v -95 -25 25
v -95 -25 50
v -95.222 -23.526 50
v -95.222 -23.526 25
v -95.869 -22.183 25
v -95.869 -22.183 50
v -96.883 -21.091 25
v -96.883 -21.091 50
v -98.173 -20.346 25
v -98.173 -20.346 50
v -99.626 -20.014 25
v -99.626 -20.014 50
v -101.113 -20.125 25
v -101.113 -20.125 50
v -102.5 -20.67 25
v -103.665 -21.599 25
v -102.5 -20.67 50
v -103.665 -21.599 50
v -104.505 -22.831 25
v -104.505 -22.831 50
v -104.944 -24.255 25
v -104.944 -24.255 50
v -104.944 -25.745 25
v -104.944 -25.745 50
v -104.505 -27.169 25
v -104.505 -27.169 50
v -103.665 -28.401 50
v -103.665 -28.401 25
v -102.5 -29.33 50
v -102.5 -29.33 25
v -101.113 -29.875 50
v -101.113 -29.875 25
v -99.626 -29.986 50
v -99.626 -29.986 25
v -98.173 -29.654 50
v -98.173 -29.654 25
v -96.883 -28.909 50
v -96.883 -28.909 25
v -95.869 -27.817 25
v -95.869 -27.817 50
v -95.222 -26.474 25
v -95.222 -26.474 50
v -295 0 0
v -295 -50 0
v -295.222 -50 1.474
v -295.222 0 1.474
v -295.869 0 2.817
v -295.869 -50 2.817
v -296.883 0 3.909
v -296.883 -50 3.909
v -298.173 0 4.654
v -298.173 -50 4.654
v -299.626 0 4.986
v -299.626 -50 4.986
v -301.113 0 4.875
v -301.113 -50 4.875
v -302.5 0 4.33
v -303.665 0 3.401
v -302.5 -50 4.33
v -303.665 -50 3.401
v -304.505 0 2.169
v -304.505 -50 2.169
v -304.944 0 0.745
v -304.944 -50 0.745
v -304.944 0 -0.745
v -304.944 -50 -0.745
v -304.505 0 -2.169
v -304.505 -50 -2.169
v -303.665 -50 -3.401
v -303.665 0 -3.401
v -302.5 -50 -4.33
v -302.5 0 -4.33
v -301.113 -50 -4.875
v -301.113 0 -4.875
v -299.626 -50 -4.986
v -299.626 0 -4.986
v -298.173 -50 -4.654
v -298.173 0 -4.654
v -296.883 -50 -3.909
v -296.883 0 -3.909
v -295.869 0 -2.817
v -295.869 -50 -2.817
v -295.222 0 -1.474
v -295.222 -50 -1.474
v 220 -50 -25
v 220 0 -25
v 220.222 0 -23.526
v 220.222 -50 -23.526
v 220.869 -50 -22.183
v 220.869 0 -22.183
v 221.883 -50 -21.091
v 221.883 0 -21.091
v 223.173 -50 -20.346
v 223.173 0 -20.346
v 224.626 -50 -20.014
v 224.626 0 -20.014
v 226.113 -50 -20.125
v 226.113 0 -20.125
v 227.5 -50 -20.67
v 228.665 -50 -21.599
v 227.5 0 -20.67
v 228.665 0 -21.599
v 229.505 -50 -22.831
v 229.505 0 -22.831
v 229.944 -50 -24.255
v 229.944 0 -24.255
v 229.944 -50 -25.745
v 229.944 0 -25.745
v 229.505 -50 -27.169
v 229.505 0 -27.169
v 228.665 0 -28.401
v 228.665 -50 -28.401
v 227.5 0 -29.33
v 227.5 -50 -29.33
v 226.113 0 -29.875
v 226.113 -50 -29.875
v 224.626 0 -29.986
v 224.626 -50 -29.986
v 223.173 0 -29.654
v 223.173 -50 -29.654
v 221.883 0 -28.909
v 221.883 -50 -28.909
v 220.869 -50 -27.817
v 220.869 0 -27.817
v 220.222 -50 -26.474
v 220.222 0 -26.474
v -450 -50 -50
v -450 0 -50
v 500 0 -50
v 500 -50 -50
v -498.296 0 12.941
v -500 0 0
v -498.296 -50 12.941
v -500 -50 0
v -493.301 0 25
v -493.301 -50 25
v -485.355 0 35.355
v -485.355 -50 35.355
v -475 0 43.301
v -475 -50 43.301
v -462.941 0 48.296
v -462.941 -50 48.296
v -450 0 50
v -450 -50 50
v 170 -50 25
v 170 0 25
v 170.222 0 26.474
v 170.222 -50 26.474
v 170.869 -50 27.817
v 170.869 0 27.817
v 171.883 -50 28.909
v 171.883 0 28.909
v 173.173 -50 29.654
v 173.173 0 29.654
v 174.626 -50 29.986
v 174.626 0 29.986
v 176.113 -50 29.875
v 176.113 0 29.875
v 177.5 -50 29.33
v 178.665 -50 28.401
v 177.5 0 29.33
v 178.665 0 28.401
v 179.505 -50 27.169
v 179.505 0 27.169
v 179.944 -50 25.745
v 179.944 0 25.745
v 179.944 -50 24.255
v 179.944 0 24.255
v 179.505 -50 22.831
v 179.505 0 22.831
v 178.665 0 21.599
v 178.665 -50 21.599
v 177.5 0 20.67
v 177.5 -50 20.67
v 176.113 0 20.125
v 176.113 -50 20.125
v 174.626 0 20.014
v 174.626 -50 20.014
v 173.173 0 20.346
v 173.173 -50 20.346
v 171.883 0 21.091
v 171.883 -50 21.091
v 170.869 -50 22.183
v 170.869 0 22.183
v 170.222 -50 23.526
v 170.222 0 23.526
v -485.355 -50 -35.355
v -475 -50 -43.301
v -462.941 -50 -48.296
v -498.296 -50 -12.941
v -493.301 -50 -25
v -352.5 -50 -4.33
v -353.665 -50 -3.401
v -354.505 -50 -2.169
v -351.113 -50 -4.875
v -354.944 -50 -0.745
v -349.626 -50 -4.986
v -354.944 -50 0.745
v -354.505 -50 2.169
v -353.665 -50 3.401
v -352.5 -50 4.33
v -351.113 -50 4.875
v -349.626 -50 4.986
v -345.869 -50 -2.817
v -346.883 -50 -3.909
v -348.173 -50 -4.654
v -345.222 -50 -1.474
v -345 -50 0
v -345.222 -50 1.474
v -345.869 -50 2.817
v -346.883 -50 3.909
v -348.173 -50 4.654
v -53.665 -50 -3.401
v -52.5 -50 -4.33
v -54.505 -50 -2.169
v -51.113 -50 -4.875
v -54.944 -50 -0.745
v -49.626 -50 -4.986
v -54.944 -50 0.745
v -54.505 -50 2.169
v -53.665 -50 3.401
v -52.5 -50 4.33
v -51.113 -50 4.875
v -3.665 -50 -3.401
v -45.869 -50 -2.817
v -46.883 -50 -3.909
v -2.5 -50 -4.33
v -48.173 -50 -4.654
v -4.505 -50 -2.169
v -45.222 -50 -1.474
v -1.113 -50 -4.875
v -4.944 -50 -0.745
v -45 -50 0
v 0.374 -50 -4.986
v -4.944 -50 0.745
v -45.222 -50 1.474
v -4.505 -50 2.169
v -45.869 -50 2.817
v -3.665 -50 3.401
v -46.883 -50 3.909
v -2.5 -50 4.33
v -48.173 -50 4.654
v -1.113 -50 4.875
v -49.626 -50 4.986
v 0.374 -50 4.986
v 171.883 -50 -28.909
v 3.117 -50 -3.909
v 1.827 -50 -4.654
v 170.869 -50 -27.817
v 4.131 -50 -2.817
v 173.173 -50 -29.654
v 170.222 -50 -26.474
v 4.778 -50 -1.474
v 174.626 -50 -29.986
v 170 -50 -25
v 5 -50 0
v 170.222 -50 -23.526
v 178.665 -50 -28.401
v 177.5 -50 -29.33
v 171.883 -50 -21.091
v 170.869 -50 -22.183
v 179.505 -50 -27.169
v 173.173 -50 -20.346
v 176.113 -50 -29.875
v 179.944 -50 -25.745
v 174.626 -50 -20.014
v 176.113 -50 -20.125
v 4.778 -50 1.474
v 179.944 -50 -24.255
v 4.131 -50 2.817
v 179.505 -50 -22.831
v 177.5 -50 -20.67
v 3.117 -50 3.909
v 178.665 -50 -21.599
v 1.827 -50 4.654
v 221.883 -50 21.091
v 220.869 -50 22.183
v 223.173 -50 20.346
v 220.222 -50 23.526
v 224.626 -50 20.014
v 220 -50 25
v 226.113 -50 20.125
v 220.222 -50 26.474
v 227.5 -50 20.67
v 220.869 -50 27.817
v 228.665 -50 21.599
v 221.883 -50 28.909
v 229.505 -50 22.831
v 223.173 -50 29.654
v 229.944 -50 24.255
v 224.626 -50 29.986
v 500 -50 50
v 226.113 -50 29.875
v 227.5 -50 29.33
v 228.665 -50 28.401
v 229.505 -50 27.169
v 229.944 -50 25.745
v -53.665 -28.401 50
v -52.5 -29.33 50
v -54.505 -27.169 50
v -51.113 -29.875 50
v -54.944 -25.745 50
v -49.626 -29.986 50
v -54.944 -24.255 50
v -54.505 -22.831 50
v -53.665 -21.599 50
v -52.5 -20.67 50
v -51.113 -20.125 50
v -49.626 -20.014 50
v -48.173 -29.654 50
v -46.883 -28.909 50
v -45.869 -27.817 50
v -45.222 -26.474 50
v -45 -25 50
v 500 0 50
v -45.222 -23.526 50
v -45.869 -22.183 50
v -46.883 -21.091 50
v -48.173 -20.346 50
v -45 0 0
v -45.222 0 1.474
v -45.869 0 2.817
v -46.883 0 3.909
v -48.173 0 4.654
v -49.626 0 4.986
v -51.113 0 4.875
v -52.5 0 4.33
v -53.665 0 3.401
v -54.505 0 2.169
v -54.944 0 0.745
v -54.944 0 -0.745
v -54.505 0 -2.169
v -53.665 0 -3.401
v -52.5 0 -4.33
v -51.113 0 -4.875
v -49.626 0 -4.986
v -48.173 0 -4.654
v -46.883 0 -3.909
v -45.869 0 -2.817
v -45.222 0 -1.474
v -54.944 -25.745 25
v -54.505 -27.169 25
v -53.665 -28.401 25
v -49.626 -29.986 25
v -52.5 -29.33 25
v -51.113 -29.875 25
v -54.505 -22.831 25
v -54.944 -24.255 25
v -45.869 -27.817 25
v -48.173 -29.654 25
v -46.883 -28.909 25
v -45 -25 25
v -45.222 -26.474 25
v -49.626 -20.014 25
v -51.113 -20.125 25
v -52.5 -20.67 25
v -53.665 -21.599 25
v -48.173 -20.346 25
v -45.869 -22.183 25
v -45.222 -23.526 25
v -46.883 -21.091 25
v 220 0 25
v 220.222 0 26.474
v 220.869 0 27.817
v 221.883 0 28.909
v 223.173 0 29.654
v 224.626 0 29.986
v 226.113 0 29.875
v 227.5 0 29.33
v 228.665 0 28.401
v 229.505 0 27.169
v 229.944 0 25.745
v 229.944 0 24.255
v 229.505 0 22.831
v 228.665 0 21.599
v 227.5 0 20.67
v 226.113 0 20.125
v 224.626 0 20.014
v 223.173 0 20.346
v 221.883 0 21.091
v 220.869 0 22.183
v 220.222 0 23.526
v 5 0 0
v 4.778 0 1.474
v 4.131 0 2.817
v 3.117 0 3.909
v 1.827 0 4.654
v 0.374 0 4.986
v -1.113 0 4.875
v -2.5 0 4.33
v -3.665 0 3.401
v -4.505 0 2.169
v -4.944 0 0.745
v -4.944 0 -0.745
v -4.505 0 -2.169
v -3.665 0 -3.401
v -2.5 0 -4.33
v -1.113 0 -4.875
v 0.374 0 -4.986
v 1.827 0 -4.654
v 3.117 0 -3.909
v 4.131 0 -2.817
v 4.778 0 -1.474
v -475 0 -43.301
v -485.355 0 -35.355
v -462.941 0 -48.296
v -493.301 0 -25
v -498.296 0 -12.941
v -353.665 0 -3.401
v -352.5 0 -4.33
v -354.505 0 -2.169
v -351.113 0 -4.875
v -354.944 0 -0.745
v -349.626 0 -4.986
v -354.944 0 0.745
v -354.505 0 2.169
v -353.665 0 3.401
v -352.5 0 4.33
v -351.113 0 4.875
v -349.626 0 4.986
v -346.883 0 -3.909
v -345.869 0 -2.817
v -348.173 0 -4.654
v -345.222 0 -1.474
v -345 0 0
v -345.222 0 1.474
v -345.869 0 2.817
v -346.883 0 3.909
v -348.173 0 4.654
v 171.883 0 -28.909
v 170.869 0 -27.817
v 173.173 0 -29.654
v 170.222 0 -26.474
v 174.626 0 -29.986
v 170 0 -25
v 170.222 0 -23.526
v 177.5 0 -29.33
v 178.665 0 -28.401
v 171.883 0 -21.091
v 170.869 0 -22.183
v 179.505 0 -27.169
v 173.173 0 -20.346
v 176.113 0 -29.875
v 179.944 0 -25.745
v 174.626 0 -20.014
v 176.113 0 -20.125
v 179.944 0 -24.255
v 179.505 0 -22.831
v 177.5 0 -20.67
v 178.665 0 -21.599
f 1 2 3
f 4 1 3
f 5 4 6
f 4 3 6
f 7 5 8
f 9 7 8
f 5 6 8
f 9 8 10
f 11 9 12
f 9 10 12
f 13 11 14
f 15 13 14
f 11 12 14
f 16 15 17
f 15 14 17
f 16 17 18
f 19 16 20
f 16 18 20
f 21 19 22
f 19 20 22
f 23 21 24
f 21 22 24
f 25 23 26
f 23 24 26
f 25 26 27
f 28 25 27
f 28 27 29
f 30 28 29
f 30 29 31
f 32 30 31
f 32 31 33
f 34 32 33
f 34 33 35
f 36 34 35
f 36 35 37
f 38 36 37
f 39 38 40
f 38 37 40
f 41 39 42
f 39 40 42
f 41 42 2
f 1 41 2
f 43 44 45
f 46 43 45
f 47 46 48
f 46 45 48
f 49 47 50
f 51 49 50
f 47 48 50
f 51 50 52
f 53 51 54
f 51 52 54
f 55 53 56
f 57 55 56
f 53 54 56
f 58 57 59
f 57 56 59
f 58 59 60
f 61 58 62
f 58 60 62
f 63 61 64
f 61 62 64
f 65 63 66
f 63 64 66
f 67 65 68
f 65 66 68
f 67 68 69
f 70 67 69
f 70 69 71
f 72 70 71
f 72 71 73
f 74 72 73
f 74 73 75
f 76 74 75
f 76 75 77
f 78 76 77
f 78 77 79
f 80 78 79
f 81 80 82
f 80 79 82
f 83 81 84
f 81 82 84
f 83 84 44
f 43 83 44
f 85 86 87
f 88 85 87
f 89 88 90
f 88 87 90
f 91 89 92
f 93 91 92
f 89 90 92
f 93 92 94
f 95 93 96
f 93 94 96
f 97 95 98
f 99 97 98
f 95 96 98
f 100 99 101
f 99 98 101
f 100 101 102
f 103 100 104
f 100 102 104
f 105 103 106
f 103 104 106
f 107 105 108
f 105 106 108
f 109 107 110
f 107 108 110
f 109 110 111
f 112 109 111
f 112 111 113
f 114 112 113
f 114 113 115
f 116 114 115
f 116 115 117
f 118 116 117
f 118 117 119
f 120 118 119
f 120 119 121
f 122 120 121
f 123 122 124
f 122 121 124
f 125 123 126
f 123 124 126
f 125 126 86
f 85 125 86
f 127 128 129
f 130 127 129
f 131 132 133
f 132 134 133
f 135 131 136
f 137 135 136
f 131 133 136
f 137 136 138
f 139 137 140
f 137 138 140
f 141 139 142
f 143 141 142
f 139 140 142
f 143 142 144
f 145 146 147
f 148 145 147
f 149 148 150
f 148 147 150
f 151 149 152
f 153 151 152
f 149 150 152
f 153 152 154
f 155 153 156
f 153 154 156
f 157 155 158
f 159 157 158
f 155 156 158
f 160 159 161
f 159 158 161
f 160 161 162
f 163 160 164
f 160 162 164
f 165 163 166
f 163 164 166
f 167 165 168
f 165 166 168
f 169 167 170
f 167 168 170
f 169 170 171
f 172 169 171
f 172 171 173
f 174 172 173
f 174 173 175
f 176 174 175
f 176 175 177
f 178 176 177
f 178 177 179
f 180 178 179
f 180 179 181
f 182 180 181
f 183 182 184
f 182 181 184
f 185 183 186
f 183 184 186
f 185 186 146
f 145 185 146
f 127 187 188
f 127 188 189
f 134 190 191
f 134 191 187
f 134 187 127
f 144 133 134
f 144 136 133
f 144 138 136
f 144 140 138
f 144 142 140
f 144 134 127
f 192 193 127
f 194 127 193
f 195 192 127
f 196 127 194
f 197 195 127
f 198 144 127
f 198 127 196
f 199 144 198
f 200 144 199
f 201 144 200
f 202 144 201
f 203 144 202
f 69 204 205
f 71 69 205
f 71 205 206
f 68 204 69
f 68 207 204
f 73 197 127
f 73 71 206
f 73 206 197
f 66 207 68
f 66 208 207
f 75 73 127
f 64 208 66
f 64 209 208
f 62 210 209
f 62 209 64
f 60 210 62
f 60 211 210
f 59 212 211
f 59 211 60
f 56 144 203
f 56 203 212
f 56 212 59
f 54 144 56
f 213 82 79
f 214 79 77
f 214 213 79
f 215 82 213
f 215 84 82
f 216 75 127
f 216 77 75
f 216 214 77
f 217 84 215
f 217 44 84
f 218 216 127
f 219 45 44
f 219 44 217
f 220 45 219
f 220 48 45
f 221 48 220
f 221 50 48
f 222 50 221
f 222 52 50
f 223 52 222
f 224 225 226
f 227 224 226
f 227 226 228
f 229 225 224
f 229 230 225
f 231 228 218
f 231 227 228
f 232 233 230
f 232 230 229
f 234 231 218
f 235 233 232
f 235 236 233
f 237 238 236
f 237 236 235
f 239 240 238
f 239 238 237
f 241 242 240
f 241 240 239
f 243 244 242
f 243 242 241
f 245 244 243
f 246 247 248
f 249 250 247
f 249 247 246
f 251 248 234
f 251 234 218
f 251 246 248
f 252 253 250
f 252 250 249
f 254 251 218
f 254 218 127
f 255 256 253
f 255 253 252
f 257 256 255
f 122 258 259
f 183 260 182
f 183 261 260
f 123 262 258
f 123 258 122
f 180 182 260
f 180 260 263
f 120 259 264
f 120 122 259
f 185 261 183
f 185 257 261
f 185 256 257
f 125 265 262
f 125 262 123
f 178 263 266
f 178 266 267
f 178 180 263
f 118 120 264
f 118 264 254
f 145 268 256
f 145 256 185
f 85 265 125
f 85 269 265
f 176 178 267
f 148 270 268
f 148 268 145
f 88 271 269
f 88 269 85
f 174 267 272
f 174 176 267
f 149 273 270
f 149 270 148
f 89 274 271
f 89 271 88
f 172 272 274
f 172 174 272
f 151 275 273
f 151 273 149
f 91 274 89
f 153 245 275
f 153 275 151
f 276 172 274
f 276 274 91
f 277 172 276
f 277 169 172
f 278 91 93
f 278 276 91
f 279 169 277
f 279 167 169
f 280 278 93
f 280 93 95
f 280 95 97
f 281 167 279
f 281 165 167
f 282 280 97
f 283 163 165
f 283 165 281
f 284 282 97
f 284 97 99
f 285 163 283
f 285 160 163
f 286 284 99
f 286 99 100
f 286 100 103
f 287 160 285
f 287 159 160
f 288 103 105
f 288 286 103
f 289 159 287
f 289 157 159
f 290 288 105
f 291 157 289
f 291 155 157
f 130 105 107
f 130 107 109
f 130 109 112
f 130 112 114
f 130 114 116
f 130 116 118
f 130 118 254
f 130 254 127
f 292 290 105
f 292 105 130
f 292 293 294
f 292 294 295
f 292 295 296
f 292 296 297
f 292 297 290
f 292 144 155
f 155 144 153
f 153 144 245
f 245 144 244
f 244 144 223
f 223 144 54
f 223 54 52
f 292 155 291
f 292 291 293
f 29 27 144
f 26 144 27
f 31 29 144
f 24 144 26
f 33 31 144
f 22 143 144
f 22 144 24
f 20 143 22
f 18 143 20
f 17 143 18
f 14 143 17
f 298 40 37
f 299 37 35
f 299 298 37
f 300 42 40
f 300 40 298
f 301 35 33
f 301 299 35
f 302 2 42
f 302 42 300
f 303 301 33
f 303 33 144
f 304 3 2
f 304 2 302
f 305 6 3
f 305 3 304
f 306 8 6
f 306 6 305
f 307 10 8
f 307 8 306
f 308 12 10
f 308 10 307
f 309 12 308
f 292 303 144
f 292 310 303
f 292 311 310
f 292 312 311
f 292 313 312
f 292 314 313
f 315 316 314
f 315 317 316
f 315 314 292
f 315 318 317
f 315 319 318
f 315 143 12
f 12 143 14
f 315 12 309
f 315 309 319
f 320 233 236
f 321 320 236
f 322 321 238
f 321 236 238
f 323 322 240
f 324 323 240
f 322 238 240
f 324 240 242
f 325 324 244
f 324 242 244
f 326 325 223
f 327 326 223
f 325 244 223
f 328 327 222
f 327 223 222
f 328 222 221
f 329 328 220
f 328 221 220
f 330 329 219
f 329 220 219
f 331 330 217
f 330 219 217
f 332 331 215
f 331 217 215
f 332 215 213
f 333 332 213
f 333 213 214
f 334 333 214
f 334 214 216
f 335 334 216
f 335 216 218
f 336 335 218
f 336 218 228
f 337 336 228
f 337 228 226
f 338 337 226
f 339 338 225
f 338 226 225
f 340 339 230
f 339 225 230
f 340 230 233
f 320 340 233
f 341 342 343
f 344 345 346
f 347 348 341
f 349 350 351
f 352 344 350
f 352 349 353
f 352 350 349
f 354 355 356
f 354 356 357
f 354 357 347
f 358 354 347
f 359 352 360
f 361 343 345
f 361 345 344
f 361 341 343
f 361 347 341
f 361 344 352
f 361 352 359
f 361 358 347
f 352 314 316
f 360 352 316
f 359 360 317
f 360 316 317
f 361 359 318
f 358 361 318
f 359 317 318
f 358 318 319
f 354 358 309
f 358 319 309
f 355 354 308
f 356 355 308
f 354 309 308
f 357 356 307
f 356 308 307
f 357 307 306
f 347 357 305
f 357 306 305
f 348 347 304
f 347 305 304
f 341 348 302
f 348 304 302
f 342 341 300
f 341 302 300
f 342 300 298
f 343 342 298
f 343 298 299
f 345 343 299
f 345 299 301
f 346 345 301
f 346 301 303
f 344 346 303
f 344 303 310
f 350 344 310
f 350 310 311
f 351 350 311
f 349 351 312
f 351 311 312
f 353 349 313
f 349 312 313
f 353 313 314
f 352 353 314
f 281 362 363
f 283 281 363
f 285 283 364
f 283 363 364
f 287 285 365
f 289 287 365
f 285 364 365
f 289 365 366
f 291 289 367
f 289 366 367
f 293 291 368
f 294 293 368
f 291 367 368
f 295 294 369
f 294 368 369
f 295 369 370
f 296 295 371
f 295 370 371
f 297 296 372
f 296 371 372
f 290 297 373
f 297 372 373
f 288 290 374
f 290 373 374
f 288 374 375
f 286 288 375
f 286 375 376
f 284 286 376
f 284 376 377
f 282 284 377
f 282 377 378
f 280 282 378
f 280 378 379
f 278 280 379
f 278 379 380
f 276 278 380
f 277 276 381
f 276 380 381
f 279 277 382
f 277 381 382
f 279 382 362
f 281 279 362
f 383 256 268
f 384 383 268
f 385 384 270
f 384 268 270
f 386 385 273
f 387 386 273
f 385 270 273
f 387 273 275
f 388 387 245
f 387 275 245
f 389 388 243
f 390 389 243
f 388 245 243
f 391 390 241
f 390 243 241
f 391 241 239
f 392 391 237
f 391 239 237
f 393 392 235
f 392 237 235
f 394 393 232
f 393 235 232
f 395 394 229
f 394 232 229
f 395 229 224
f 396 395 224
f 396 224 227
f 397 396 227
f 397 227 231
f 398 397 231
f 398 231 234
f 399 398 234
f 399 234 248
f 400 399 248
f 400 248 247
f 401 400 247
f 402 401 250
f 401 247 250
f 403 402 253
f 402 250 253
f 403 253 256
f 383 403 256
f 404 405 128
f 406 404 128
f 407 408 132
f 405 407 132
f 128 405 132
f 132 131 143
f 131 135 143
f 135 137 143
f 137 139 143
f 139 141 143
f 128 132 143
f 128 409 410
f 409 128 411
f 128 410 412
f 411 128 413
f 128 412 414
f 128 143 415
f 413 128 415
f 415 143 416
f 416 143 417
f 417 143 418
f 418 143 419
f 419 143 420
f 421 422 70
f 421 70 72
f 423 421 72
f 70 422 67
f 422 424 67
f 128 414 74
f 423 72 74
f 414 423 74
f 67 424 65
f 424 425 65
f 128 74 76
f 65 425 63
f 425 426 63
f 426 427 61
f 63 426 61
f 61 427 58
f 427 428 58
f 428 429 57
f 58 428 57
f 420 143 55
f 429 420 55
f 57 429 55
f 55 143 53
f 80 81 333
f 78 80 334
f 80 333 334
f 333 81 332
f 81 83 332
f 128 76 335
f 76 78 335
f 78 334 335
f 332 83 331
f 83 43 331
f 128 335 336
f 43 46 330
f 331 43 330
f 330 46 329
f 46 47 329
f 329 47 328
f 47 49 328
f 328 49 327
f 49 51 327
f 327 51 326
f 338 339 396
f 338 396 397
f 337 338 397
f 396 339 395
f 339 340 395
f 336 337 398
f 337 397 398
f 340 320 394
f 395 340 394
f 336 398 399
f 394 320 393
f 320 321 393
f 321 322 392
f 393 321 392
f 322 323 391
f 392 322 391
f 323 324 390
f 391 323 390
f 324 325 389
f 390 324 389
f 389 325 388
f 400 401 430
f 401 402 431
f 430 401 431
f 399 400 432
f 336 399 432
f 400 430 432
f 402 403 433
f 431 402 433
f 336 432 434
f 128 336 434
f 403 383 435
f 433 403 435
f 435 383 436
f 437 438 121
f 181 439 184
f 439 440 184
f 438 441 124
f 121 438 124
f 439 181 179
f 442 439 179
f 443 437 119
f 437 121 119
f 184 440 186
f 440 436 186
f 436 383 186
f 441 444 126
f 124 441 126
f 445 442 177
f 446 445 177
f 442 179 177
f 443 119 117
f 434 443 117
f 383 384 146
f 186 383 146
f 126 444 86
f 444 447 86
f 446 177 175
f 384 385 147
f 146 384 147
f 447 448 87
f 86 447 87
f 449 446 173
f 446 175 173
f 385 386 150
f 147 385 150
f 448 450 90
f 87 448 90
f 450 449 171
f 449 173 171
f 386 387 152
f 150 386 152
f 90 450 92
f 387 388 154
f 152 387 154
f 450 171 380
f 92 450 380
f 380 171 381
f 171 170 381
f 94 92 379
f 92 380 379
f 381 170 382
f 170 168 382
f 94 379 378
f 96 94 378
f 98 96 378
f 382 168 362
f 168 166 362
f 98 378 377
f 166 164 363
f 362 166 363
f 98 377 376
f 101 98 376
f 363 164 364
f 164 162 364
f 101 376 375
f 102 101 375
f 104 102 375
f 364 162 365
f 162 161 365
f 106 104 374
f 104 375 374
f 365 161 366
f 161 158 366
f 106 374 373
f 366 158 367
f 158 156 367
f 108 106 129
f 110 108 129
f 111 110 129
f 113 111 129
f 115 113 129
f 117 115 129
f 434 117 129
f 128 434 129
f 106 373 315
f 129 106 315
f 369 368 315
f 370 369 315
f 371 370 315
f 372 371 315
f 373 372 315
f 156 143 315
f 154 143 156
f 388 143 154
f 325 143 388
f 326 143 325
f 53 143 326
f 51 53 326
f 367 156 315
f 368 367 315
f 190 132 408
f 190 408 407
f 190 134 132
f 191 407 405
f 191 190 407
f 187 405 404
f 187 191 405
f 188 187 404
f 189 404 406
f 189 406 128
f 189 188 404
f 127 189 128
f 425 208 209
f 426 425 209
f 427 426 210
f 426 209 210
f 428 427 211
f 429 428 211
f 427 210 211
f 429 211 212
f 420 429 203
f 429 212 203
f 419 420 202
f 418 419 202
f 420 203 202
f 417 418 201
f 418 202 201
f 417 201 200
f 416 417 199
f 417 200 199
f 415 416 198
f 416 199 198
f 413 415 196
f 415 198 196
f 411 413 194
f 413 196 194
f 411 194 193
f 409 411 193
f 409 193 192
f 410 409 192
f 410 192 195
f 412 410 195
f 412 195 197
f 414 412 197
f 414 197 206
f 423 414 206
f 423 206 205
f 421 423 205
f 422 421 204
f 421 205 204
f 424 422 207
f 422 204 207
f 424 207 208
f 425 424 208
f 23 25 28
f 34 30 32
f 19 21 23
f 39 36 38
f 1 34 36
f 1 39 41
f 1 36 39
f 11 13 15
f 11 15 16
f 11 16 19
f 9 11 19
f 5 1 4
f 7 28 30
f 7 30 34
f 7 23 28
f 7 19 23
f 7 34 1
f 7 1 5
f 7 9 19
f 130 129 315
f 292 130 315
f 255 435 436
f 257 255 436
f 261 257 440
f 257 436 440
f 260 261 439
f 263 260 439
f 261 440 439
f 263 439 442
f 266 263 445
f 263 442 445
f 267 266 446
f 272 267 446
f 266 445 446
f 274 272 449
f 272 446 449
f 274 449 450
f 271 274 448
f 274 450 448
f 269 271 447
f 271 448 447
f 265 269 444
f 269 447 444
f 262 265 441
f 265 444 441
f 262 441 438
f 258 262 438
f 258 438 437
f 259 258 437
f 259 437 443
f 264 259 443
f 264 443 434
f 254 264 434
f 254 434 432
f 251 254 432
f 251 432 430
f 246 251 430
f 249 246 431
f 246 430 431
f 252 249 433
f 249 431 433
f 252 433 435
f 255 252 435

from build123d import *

# Parameters (mm, degrees)
F0_W     = 1000
F0_H     = 100
F1_DEPTH = 50
F3_R     = 5
F4_DEPTH = 25
F2_R     = 5
F5_DEPTH = 50
F6_R     = 5
F7_DEPTH = 50
F8_R     = 49.99999


# Not quite as in the source:
# - a fillet or chamfer is up to 0.001 mm smaller than in the source, because OpenCascade refuses the exact size


with BuildPart() as f1:
    # F0 (on Front) → F1 (new body)
    with BuildSketch(Plane.XZ):
        Rectangle(F0_W, F0_H)
    extrude(amount=F1_DEPTH)

    # F3 (on face) → F4 (cut)
    with BuildSketch(Plane.XY.offset(50)):
        with Locations((-100, -25)):
            Circle(F3_R)
        with Locations((-50, -25)):
            Circle(F3_R)
    extrude(amount=-F4_DEPTH, mode=Mode.SUBTRACT)

    # F2 (on face) → F5 (cut)
    with BuildSketch(Plane.XZ.offset(50)):
        with Locations((-50, 0)):
            Circle(F2_R)
        Circle(F2_R)
        with Locations((-350, 0)):
            Circle(F2_R)
        with Locations((-300, 0)):
            Circle(F2_R)
    extrude(amount=-F5_DEPTH, mode=Mode.SUBTRACT)

    # F6 (on face) → F7 (cut)
    with BuildSketch(Plane(origin=(0, 0, 0), x_dir=(-1, 0, 0), z_dir=(0, 1, 0))):
        with Locations((-225, -25)):
            Circle(F6_R)
        with Locations((-175, -25)):
            Circle(F6_R)
        with Locations((-225, 25)):
            Circle(F6_R)
        with Locations((-175, 25)):
            Circle(F6_R)
    extrude(amount=-F7_DEPTH, mode=Mode.SUBTRACT)

    # F8 (radius 50 in the source; OpenCascade refuses exactly that, so slightly less here)
    f8_edges = [f1.edges().sort_by_distance(p)[0] for p in [
        (-500, -25, 50),
        (-500, -25, -50),
    ]]
    fillet(f8_edges, radius=F8_R)


solid = f1.part
